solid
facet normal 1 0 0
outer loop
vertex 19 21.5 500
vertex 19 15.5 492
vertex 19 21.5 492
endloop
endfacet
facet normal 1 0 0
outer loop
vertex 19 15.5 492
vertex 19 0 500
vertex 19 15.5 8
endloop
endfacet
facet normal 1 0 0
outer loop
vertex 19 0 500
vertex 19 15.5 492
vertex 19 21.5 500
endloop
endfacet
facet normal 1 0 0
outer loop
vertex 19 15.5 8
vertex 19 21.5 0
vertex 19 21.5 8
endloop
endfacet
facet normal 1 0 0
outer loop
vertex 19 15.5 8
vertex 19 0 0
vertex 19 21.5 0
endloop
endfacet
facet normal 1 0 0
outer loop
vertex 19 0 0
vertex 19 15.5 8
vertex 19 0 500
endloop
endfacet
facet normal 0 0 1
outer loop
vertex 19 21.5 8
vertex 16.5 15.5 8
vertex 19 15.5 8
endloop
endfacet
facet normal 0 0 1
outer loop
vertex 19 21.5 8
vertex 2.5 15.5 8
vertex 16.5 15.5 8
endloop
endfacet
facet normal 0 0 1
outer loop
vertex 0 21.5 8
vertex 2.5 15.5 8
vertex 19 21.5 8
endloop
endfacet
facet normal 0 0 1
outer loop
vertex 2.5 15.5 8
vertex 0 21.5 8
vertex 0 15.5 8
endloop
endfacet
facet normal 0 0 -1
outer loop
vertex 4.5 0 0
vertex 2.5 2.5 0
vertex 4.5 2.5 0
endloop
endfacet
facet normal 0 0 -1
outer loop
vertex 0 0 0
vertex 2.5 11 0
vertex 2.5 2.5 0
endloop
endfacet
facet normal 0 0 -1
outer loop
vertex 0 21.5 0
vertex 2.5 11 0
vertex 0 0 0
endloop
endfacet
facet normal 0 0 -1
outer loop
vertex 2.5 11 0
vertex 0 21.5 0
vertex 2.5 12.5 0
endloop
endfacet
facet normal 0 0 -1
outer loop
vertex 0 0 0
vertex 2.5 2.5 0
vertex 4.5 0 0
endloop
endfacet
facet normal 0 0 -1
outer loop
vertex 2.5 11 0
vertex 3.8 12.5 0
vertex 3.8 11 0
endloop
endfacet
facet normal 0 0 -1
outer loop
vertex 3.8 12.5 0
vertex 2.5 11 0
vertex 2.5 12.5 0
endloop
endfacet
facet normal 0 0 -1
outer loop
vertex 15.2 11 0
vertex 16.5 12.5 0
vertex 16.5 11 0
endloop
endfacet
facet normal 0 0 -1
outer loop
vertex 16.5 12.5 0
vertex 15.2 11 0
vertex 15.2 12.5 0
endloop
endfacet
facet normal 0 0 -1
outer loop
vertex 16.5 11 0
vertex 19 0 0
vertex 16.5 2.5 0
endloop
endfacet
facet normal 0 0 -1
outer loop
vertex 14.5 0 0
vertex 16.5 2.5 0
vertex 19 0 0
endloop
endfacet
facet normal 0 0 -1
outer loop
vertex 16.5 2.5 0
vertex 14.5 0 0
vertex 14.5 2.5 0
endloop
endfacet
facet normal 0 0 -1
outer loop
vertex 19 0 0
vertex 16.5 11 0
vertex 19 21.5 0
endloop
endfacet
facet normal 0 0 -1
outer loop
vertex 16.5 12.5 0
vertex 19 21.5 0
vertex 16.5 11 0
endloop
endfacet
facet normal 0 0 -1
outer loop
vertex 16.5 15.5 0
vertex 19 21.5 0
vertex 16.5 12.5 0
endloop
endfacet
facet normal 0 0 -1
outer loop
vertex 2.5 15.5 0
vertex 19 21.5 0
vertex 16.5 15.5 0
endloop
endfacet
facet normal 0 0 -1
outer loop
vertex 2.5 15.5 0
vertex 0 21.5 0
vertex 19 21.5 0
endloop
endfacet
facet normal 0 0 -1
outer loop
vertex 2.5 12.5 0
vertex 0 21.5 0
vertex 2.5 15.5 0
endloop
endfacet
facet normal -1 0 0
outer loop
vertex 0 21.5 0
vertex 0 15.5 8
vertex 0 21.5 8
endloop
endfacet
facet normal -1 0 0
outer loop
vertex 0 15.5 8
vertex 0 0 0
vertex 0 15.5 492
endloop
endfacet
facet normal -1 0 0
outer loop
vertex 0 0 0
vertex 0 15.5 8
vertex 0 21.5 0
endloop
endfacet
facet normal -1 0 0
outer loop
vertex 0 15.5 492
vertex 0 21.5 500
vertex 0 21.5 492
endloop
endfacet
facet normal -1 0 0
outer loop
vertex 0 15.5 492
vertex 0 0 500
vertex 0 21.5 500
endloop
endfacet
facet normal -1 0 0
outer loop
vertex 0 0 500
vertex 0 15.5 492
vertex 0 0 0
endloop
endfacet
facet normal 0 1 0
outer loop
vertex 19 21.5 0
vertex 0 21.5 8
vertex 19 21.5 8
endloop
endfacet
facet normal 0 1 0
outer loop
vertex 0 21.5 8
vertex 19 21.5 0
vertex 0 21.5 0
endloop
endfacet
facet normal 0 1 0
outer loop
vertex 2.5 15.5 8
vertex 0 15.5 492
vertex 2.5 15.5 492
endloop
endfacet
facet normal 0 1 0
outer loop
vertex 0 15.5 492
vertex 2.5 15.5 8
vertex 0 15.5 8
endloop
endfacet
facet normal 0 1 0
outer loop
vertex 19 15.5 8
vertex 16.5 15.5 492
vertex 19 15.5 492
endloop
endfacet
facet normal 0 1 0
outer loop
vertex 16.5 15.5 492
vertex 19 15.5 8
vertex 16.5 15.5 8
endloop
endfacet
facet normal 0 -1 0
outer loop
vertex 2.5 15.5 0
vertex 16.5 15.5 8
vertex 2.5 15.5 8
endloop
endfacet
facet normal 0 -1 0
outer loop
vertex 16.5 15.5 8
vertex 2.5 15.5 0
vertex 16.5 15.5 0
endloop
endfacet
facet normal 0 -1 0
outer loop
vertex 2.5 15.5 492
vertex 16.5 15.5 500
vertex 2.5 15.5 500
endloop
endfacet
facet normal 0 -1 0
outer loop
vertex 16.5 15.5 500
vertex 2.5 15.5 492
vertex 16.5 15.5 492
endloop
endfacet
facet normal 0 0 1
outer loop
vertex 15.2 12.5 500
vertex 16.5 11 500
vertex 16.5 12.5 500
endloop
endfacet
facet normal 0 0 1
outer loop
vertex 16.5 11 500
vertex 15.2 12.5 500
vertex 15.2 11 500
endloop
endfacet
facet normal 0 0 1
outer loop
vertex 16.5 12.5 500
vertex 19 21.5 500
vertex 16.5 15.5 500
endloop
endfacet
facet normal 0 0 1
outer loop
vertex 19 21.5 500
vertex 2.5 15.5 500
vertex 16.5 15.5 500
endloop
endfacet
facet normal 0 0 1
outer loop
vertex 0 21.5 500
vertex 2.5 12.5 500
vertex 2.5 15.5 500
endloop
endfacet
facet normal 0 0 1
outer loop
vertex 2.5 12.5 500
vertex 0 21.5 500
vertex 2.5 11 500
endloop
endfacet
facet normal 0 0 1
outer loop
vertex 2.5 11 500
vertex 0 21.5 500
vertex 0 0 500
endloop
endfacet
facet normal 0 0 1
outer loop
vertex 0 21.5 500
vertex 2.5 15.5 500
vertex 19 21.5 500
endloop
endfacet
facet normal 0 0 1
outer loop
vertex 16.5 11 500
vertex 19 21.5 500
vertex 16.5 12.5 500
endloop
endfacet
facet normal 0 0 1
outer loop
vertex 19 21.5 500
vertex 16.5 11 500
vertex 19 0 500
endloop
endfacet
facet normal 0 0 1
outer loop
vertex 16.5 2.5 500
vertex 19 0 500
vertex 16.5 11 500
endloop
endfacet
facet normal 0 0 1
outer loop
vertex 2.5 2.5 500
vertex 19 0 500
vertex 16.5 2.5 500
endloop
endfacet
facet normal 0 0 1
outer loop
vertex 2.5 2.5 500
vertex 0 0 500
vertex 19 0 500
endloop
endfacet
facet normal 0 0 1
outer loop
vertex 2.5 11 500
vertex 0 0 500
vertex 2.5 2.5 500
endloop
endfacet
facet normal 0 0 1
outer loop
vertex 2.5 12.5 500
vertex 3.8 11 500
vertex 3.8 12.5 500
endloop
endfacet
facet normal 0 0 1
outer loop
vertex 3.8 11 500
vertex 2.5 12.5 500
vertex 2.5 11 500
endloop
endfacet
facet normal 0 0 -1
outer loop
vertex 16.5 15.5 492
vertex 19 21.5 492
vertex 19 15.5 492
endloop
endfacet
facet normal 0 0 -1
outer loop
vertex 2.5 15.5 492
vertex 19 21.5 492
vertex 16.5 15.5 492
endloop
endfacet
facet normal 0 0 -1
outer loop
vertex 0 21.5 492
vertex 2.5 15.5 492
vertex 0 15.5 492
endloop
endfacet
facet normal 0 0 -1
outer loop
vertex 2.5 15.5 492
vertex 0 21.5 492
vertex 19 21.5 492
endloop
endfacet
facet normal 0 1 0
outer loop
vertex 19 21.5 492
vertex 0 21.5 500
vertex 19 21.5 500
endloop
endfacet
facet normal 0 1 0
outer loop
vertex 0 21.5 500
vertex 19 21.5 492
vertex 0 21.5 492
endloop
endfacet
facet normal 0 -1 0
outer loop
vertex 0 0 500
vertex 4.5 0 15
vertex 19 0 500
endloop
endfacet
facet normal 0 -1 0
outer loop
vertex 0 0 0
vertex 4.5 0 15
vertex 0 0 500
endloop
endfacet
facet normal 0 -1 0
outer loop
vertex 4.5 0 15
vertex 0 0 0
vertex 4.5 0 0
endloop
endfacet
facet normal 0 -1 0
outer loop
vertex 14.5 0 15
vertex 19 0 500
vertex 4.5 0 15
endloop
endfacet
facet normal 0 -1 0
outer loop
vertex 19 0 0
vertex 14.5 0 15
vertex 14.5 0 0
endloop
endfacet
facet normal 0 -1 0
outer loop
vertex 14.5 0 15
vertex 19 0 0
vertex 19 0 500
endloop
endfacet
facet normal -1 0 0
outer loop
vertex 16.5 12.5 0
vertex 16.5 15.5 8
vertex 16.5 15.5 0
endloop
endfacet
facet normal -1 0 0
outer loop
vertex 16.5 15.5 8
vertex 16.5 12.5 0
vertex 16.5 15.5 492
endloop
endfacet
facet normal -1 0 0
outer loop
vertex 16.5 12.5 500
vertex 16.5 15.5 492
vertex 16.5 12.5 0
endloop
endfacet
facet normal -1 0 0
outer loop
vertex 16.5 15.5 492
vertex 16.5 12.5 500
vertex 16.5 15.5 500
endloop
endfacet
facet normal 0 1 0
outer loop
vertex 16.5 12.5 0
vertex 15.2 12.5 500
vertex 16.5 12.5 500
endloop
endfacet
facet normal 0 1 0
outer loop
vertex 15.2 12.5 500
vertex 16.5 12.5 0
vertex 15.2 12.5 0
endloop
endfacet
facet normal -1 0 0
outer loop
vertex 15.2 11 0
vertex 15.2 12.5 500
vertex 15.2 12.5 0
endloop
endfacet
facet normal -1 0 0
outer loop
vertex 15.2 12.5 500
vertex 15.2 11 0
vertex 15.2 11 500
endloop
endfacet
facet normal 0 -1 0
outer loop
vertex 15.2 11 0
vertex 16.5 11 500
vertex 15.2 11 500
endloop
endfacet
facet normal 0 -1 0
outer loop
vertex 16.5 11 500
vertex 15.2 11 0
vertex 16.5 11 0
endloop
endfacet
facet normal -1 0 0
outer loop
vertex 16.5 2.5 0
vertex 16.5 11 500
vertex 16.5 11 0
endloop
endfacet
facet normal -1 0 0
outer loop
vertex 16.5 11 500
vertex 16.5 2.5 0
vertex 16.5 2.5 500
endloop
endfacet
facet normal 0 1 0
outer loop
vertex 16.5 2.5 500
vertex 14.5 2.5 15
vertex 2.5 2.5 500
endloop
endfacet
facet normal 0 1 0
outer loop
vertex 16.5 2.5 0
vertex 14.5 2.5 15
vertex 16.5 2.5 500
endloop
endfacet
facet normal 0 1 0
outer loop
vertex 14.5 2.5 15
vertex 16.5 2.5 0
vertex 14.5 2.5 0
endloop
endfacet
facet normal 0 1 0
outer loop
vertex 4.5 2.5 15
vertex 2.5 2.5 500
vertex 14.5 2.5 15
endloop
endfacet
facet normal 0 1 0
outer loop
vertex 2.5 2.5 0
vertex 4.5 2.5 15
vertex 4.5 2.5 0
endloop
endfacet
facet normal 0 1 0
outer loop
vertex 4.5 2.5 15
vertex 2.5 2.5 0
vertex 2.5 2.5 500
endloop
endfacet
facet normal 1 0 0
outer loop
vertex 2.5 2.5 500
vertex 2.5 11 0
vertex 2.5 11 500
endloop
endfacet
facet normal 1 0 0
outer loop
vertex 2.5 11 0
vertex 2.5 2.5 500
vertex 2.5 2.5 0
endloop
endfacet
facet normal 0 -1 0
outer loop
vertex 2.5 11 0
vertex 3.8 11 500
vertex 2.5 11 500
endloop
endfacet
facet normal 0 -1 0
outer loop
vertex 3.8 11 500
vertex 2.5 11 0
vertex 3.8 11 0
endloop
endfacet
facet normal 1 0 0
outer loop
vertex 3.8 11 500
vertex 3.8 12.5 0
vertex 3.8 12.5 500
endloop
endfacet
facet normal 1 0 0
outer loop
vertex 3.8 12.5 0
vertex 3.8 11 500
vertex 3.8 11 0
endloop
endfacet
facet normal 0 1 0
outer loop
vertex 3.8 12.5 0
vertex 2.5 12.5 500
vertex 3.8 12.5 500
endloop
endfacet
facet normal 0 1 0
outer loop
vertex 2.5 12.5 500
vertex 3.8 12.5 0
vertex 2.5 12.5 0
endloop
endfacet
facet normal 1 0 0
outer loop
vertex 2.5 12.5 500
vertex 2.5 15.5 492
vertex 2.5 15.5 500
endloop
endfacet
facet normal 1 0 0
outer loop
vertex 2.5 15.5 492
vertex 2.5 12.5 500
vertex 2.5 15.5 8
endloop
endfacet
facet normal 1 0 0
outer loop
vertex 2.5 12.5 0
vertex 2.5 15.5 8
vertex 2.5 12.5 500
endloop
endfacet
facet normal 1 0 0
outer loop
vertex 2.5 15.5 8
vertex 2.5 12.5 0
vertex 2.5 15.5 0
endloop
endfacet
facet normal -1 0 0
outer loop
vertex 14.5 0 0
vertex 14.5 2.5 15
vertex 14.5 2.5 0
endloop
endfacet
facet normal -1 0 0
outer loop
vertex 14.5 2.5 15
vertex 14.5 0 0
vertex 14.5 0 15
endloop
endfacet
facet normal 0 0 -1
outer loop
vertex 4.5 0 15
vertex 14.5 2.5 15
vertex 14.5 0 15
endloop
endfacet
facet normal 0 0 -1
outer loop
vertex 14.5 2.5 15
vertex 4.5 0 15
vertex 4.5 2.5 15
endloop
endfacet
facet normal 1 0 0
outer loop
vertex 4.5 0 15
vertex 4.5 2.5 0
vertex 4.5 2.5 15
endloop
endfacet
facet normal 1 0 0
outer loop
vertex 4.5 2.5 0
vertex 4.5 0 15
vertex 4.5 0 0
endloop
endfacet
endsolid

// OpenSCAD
// =============================================================================
// ISKANDER HEARTH — NeoPixel LED Matrix Top Panel Mount v1
// File: led_matrix_mount_v1.scad
// =============================================================================
// License : CERN Open Hardware Licence v2 – Strongly Reciprocal (CERN-OHL-S)
// Phase   : 6 — Glass Box Physical UX
//
// A recessed channel that sits in the top panel of the chassis and holds the
// WS2812B NeoPixel strip (P6-002: 60 LED/m, 0.5m, 30 LEDs total) behind a
// 3mm frosted acrylic diffuser panel (P6-003).
//
// MOUNTING: The mount clips into a routed slot in the chassis v2 top panel.
//           Diffuser panel slides in from the side and is retained by clip rails.
//
// DIMENSIONS:
//   Strip width: 10mm (WS2812B 60/m PCB width)
//   Strip length: 500mm (0.5m, 30 LEDs)
//   Diffuser: 3mm frosted acrylic, cut to channel opening dimensions
//
// PRINT SETTINGS: 4 perimeters, 20% gyroid infill, 0.2mm layer, white PETG
//                 (white interior reflects light from strip toward diffuser)
// =============================================================================


// =============================================================================
// SECTION 1 — PARAMETERS
// =============================================================================

// --- LED strip dimensions ---
strip_l     = 500;  // [mm] Strip length (0.5m)
strip_w     = 10;   // [mm] Strip PCB width (WS2812B 60/m)
strip_h     = 3;    // [mm] Strip PCB + LED height above adhesive back

// --- Channel body ---
channel_w   = strip_w + 4;   // [mm] Channel interior width (strip + 2mm each side)
channel_h   = strip_h + 10;  // [mm] Channel depth (strip + diffuser gap + diffuser)
channel_t   = 2.5;            // [mm] Channel wall thickness

// --- Diffuser ---
diffuser_t  = 3;    // [mm] 3mm frosted acrylic
diffuser_gap = 7;   // [mm] Air gap between strip LEDs and diffuser (softens dot pattern)

// --- Clip rail (retains diffuser) ---
clip_t      = 1.5;  // [mm] Clip rail thickness
clip_inset  = 1.0;  // [mm] How far the clip overhangs to retain diffuser

// --- Mounting tabs ---
tab_w       = 8;    // [mm] Width of chassis mounting tabs
tab_h       = 6;    // [mm] Height of mounting tabs
tab_slot_w  = strip_l;  // Tabs spaced at strip length

// --- Fit tolerance ---
fit_t       = 0.3;  // [mm] Tight press-fit for diffuser rail


// =============================================================================
// SECTION 2 — MODULES
// =============================================================================

// Cross-section profile of the LED channel (extruded along strip length)
module channel_profile() {
    outer_w = channel_w + channel_t * 2;
    outer_h = channel_h + channel_t;

    difference() {
        // Outer body
        square([outer_w, outer_h]);

        // Inner channel (open at top for diffuser)
        translate([channel_t, channel_t])
        square([channel_w, channel_h]);
    }

    // Diffuser clip rails — top inner corners, inset to retain 3mm diffuser
    translate([channel_t, channel_t + diffuser_gap + strip_h - clip_t])
    square([clip_inset + fit_t, clip_t]);

    translate([channel_t + channel_w - clip_inset - fit_t, channel_t + diffuser_gap + strip_h - clip_t])
    square([clip_inset + fit_t, clip_t]);
}


module led_channel_mount() {
    // Main channel body — linear extrusion of cross-section along strip length
    linear_extrude(height = strip_l)
    channel_profile();

    // Mounting tabs at each end (for chassis top panel retention)
    for (z_pos = [0, strip_l - tab_w]) {
        translate([0, channel_h + channel_t, z_pos])
        cube([channel_w + channel_t * 2, tab_h, tab_w]);
    }
}


// Diffuser blank (for reference / manual cutting guide output)
// Use projection(cut=true) to get DXF profile for laser cutting
module diffuser_blank() {
    cube([channel_w + fit_t * 2, diffuser_t, strip_l]);
}


// Wire exit port at one end of the channel (for JST-XH connector clearance)
module wire_exit() {
    translate([channel_t + channel_w / 2 - 5, -0.1, 0])
    cube([10, channel_t + 0.2, 15]);
}


// =============================================================================
// SECTION 3 — RENDER
// =============================================================================

difference() {
    led_channel_mount();
    wire_exit();
}

// diffuser_blank();   // <-- uncomment to export diffuser DXF outline via projection

// Strip ghost (for clearance check):
// %translate([channel_t + 2, channel_t, 0]) cube([strip_w, strip_h, strip_l]);
